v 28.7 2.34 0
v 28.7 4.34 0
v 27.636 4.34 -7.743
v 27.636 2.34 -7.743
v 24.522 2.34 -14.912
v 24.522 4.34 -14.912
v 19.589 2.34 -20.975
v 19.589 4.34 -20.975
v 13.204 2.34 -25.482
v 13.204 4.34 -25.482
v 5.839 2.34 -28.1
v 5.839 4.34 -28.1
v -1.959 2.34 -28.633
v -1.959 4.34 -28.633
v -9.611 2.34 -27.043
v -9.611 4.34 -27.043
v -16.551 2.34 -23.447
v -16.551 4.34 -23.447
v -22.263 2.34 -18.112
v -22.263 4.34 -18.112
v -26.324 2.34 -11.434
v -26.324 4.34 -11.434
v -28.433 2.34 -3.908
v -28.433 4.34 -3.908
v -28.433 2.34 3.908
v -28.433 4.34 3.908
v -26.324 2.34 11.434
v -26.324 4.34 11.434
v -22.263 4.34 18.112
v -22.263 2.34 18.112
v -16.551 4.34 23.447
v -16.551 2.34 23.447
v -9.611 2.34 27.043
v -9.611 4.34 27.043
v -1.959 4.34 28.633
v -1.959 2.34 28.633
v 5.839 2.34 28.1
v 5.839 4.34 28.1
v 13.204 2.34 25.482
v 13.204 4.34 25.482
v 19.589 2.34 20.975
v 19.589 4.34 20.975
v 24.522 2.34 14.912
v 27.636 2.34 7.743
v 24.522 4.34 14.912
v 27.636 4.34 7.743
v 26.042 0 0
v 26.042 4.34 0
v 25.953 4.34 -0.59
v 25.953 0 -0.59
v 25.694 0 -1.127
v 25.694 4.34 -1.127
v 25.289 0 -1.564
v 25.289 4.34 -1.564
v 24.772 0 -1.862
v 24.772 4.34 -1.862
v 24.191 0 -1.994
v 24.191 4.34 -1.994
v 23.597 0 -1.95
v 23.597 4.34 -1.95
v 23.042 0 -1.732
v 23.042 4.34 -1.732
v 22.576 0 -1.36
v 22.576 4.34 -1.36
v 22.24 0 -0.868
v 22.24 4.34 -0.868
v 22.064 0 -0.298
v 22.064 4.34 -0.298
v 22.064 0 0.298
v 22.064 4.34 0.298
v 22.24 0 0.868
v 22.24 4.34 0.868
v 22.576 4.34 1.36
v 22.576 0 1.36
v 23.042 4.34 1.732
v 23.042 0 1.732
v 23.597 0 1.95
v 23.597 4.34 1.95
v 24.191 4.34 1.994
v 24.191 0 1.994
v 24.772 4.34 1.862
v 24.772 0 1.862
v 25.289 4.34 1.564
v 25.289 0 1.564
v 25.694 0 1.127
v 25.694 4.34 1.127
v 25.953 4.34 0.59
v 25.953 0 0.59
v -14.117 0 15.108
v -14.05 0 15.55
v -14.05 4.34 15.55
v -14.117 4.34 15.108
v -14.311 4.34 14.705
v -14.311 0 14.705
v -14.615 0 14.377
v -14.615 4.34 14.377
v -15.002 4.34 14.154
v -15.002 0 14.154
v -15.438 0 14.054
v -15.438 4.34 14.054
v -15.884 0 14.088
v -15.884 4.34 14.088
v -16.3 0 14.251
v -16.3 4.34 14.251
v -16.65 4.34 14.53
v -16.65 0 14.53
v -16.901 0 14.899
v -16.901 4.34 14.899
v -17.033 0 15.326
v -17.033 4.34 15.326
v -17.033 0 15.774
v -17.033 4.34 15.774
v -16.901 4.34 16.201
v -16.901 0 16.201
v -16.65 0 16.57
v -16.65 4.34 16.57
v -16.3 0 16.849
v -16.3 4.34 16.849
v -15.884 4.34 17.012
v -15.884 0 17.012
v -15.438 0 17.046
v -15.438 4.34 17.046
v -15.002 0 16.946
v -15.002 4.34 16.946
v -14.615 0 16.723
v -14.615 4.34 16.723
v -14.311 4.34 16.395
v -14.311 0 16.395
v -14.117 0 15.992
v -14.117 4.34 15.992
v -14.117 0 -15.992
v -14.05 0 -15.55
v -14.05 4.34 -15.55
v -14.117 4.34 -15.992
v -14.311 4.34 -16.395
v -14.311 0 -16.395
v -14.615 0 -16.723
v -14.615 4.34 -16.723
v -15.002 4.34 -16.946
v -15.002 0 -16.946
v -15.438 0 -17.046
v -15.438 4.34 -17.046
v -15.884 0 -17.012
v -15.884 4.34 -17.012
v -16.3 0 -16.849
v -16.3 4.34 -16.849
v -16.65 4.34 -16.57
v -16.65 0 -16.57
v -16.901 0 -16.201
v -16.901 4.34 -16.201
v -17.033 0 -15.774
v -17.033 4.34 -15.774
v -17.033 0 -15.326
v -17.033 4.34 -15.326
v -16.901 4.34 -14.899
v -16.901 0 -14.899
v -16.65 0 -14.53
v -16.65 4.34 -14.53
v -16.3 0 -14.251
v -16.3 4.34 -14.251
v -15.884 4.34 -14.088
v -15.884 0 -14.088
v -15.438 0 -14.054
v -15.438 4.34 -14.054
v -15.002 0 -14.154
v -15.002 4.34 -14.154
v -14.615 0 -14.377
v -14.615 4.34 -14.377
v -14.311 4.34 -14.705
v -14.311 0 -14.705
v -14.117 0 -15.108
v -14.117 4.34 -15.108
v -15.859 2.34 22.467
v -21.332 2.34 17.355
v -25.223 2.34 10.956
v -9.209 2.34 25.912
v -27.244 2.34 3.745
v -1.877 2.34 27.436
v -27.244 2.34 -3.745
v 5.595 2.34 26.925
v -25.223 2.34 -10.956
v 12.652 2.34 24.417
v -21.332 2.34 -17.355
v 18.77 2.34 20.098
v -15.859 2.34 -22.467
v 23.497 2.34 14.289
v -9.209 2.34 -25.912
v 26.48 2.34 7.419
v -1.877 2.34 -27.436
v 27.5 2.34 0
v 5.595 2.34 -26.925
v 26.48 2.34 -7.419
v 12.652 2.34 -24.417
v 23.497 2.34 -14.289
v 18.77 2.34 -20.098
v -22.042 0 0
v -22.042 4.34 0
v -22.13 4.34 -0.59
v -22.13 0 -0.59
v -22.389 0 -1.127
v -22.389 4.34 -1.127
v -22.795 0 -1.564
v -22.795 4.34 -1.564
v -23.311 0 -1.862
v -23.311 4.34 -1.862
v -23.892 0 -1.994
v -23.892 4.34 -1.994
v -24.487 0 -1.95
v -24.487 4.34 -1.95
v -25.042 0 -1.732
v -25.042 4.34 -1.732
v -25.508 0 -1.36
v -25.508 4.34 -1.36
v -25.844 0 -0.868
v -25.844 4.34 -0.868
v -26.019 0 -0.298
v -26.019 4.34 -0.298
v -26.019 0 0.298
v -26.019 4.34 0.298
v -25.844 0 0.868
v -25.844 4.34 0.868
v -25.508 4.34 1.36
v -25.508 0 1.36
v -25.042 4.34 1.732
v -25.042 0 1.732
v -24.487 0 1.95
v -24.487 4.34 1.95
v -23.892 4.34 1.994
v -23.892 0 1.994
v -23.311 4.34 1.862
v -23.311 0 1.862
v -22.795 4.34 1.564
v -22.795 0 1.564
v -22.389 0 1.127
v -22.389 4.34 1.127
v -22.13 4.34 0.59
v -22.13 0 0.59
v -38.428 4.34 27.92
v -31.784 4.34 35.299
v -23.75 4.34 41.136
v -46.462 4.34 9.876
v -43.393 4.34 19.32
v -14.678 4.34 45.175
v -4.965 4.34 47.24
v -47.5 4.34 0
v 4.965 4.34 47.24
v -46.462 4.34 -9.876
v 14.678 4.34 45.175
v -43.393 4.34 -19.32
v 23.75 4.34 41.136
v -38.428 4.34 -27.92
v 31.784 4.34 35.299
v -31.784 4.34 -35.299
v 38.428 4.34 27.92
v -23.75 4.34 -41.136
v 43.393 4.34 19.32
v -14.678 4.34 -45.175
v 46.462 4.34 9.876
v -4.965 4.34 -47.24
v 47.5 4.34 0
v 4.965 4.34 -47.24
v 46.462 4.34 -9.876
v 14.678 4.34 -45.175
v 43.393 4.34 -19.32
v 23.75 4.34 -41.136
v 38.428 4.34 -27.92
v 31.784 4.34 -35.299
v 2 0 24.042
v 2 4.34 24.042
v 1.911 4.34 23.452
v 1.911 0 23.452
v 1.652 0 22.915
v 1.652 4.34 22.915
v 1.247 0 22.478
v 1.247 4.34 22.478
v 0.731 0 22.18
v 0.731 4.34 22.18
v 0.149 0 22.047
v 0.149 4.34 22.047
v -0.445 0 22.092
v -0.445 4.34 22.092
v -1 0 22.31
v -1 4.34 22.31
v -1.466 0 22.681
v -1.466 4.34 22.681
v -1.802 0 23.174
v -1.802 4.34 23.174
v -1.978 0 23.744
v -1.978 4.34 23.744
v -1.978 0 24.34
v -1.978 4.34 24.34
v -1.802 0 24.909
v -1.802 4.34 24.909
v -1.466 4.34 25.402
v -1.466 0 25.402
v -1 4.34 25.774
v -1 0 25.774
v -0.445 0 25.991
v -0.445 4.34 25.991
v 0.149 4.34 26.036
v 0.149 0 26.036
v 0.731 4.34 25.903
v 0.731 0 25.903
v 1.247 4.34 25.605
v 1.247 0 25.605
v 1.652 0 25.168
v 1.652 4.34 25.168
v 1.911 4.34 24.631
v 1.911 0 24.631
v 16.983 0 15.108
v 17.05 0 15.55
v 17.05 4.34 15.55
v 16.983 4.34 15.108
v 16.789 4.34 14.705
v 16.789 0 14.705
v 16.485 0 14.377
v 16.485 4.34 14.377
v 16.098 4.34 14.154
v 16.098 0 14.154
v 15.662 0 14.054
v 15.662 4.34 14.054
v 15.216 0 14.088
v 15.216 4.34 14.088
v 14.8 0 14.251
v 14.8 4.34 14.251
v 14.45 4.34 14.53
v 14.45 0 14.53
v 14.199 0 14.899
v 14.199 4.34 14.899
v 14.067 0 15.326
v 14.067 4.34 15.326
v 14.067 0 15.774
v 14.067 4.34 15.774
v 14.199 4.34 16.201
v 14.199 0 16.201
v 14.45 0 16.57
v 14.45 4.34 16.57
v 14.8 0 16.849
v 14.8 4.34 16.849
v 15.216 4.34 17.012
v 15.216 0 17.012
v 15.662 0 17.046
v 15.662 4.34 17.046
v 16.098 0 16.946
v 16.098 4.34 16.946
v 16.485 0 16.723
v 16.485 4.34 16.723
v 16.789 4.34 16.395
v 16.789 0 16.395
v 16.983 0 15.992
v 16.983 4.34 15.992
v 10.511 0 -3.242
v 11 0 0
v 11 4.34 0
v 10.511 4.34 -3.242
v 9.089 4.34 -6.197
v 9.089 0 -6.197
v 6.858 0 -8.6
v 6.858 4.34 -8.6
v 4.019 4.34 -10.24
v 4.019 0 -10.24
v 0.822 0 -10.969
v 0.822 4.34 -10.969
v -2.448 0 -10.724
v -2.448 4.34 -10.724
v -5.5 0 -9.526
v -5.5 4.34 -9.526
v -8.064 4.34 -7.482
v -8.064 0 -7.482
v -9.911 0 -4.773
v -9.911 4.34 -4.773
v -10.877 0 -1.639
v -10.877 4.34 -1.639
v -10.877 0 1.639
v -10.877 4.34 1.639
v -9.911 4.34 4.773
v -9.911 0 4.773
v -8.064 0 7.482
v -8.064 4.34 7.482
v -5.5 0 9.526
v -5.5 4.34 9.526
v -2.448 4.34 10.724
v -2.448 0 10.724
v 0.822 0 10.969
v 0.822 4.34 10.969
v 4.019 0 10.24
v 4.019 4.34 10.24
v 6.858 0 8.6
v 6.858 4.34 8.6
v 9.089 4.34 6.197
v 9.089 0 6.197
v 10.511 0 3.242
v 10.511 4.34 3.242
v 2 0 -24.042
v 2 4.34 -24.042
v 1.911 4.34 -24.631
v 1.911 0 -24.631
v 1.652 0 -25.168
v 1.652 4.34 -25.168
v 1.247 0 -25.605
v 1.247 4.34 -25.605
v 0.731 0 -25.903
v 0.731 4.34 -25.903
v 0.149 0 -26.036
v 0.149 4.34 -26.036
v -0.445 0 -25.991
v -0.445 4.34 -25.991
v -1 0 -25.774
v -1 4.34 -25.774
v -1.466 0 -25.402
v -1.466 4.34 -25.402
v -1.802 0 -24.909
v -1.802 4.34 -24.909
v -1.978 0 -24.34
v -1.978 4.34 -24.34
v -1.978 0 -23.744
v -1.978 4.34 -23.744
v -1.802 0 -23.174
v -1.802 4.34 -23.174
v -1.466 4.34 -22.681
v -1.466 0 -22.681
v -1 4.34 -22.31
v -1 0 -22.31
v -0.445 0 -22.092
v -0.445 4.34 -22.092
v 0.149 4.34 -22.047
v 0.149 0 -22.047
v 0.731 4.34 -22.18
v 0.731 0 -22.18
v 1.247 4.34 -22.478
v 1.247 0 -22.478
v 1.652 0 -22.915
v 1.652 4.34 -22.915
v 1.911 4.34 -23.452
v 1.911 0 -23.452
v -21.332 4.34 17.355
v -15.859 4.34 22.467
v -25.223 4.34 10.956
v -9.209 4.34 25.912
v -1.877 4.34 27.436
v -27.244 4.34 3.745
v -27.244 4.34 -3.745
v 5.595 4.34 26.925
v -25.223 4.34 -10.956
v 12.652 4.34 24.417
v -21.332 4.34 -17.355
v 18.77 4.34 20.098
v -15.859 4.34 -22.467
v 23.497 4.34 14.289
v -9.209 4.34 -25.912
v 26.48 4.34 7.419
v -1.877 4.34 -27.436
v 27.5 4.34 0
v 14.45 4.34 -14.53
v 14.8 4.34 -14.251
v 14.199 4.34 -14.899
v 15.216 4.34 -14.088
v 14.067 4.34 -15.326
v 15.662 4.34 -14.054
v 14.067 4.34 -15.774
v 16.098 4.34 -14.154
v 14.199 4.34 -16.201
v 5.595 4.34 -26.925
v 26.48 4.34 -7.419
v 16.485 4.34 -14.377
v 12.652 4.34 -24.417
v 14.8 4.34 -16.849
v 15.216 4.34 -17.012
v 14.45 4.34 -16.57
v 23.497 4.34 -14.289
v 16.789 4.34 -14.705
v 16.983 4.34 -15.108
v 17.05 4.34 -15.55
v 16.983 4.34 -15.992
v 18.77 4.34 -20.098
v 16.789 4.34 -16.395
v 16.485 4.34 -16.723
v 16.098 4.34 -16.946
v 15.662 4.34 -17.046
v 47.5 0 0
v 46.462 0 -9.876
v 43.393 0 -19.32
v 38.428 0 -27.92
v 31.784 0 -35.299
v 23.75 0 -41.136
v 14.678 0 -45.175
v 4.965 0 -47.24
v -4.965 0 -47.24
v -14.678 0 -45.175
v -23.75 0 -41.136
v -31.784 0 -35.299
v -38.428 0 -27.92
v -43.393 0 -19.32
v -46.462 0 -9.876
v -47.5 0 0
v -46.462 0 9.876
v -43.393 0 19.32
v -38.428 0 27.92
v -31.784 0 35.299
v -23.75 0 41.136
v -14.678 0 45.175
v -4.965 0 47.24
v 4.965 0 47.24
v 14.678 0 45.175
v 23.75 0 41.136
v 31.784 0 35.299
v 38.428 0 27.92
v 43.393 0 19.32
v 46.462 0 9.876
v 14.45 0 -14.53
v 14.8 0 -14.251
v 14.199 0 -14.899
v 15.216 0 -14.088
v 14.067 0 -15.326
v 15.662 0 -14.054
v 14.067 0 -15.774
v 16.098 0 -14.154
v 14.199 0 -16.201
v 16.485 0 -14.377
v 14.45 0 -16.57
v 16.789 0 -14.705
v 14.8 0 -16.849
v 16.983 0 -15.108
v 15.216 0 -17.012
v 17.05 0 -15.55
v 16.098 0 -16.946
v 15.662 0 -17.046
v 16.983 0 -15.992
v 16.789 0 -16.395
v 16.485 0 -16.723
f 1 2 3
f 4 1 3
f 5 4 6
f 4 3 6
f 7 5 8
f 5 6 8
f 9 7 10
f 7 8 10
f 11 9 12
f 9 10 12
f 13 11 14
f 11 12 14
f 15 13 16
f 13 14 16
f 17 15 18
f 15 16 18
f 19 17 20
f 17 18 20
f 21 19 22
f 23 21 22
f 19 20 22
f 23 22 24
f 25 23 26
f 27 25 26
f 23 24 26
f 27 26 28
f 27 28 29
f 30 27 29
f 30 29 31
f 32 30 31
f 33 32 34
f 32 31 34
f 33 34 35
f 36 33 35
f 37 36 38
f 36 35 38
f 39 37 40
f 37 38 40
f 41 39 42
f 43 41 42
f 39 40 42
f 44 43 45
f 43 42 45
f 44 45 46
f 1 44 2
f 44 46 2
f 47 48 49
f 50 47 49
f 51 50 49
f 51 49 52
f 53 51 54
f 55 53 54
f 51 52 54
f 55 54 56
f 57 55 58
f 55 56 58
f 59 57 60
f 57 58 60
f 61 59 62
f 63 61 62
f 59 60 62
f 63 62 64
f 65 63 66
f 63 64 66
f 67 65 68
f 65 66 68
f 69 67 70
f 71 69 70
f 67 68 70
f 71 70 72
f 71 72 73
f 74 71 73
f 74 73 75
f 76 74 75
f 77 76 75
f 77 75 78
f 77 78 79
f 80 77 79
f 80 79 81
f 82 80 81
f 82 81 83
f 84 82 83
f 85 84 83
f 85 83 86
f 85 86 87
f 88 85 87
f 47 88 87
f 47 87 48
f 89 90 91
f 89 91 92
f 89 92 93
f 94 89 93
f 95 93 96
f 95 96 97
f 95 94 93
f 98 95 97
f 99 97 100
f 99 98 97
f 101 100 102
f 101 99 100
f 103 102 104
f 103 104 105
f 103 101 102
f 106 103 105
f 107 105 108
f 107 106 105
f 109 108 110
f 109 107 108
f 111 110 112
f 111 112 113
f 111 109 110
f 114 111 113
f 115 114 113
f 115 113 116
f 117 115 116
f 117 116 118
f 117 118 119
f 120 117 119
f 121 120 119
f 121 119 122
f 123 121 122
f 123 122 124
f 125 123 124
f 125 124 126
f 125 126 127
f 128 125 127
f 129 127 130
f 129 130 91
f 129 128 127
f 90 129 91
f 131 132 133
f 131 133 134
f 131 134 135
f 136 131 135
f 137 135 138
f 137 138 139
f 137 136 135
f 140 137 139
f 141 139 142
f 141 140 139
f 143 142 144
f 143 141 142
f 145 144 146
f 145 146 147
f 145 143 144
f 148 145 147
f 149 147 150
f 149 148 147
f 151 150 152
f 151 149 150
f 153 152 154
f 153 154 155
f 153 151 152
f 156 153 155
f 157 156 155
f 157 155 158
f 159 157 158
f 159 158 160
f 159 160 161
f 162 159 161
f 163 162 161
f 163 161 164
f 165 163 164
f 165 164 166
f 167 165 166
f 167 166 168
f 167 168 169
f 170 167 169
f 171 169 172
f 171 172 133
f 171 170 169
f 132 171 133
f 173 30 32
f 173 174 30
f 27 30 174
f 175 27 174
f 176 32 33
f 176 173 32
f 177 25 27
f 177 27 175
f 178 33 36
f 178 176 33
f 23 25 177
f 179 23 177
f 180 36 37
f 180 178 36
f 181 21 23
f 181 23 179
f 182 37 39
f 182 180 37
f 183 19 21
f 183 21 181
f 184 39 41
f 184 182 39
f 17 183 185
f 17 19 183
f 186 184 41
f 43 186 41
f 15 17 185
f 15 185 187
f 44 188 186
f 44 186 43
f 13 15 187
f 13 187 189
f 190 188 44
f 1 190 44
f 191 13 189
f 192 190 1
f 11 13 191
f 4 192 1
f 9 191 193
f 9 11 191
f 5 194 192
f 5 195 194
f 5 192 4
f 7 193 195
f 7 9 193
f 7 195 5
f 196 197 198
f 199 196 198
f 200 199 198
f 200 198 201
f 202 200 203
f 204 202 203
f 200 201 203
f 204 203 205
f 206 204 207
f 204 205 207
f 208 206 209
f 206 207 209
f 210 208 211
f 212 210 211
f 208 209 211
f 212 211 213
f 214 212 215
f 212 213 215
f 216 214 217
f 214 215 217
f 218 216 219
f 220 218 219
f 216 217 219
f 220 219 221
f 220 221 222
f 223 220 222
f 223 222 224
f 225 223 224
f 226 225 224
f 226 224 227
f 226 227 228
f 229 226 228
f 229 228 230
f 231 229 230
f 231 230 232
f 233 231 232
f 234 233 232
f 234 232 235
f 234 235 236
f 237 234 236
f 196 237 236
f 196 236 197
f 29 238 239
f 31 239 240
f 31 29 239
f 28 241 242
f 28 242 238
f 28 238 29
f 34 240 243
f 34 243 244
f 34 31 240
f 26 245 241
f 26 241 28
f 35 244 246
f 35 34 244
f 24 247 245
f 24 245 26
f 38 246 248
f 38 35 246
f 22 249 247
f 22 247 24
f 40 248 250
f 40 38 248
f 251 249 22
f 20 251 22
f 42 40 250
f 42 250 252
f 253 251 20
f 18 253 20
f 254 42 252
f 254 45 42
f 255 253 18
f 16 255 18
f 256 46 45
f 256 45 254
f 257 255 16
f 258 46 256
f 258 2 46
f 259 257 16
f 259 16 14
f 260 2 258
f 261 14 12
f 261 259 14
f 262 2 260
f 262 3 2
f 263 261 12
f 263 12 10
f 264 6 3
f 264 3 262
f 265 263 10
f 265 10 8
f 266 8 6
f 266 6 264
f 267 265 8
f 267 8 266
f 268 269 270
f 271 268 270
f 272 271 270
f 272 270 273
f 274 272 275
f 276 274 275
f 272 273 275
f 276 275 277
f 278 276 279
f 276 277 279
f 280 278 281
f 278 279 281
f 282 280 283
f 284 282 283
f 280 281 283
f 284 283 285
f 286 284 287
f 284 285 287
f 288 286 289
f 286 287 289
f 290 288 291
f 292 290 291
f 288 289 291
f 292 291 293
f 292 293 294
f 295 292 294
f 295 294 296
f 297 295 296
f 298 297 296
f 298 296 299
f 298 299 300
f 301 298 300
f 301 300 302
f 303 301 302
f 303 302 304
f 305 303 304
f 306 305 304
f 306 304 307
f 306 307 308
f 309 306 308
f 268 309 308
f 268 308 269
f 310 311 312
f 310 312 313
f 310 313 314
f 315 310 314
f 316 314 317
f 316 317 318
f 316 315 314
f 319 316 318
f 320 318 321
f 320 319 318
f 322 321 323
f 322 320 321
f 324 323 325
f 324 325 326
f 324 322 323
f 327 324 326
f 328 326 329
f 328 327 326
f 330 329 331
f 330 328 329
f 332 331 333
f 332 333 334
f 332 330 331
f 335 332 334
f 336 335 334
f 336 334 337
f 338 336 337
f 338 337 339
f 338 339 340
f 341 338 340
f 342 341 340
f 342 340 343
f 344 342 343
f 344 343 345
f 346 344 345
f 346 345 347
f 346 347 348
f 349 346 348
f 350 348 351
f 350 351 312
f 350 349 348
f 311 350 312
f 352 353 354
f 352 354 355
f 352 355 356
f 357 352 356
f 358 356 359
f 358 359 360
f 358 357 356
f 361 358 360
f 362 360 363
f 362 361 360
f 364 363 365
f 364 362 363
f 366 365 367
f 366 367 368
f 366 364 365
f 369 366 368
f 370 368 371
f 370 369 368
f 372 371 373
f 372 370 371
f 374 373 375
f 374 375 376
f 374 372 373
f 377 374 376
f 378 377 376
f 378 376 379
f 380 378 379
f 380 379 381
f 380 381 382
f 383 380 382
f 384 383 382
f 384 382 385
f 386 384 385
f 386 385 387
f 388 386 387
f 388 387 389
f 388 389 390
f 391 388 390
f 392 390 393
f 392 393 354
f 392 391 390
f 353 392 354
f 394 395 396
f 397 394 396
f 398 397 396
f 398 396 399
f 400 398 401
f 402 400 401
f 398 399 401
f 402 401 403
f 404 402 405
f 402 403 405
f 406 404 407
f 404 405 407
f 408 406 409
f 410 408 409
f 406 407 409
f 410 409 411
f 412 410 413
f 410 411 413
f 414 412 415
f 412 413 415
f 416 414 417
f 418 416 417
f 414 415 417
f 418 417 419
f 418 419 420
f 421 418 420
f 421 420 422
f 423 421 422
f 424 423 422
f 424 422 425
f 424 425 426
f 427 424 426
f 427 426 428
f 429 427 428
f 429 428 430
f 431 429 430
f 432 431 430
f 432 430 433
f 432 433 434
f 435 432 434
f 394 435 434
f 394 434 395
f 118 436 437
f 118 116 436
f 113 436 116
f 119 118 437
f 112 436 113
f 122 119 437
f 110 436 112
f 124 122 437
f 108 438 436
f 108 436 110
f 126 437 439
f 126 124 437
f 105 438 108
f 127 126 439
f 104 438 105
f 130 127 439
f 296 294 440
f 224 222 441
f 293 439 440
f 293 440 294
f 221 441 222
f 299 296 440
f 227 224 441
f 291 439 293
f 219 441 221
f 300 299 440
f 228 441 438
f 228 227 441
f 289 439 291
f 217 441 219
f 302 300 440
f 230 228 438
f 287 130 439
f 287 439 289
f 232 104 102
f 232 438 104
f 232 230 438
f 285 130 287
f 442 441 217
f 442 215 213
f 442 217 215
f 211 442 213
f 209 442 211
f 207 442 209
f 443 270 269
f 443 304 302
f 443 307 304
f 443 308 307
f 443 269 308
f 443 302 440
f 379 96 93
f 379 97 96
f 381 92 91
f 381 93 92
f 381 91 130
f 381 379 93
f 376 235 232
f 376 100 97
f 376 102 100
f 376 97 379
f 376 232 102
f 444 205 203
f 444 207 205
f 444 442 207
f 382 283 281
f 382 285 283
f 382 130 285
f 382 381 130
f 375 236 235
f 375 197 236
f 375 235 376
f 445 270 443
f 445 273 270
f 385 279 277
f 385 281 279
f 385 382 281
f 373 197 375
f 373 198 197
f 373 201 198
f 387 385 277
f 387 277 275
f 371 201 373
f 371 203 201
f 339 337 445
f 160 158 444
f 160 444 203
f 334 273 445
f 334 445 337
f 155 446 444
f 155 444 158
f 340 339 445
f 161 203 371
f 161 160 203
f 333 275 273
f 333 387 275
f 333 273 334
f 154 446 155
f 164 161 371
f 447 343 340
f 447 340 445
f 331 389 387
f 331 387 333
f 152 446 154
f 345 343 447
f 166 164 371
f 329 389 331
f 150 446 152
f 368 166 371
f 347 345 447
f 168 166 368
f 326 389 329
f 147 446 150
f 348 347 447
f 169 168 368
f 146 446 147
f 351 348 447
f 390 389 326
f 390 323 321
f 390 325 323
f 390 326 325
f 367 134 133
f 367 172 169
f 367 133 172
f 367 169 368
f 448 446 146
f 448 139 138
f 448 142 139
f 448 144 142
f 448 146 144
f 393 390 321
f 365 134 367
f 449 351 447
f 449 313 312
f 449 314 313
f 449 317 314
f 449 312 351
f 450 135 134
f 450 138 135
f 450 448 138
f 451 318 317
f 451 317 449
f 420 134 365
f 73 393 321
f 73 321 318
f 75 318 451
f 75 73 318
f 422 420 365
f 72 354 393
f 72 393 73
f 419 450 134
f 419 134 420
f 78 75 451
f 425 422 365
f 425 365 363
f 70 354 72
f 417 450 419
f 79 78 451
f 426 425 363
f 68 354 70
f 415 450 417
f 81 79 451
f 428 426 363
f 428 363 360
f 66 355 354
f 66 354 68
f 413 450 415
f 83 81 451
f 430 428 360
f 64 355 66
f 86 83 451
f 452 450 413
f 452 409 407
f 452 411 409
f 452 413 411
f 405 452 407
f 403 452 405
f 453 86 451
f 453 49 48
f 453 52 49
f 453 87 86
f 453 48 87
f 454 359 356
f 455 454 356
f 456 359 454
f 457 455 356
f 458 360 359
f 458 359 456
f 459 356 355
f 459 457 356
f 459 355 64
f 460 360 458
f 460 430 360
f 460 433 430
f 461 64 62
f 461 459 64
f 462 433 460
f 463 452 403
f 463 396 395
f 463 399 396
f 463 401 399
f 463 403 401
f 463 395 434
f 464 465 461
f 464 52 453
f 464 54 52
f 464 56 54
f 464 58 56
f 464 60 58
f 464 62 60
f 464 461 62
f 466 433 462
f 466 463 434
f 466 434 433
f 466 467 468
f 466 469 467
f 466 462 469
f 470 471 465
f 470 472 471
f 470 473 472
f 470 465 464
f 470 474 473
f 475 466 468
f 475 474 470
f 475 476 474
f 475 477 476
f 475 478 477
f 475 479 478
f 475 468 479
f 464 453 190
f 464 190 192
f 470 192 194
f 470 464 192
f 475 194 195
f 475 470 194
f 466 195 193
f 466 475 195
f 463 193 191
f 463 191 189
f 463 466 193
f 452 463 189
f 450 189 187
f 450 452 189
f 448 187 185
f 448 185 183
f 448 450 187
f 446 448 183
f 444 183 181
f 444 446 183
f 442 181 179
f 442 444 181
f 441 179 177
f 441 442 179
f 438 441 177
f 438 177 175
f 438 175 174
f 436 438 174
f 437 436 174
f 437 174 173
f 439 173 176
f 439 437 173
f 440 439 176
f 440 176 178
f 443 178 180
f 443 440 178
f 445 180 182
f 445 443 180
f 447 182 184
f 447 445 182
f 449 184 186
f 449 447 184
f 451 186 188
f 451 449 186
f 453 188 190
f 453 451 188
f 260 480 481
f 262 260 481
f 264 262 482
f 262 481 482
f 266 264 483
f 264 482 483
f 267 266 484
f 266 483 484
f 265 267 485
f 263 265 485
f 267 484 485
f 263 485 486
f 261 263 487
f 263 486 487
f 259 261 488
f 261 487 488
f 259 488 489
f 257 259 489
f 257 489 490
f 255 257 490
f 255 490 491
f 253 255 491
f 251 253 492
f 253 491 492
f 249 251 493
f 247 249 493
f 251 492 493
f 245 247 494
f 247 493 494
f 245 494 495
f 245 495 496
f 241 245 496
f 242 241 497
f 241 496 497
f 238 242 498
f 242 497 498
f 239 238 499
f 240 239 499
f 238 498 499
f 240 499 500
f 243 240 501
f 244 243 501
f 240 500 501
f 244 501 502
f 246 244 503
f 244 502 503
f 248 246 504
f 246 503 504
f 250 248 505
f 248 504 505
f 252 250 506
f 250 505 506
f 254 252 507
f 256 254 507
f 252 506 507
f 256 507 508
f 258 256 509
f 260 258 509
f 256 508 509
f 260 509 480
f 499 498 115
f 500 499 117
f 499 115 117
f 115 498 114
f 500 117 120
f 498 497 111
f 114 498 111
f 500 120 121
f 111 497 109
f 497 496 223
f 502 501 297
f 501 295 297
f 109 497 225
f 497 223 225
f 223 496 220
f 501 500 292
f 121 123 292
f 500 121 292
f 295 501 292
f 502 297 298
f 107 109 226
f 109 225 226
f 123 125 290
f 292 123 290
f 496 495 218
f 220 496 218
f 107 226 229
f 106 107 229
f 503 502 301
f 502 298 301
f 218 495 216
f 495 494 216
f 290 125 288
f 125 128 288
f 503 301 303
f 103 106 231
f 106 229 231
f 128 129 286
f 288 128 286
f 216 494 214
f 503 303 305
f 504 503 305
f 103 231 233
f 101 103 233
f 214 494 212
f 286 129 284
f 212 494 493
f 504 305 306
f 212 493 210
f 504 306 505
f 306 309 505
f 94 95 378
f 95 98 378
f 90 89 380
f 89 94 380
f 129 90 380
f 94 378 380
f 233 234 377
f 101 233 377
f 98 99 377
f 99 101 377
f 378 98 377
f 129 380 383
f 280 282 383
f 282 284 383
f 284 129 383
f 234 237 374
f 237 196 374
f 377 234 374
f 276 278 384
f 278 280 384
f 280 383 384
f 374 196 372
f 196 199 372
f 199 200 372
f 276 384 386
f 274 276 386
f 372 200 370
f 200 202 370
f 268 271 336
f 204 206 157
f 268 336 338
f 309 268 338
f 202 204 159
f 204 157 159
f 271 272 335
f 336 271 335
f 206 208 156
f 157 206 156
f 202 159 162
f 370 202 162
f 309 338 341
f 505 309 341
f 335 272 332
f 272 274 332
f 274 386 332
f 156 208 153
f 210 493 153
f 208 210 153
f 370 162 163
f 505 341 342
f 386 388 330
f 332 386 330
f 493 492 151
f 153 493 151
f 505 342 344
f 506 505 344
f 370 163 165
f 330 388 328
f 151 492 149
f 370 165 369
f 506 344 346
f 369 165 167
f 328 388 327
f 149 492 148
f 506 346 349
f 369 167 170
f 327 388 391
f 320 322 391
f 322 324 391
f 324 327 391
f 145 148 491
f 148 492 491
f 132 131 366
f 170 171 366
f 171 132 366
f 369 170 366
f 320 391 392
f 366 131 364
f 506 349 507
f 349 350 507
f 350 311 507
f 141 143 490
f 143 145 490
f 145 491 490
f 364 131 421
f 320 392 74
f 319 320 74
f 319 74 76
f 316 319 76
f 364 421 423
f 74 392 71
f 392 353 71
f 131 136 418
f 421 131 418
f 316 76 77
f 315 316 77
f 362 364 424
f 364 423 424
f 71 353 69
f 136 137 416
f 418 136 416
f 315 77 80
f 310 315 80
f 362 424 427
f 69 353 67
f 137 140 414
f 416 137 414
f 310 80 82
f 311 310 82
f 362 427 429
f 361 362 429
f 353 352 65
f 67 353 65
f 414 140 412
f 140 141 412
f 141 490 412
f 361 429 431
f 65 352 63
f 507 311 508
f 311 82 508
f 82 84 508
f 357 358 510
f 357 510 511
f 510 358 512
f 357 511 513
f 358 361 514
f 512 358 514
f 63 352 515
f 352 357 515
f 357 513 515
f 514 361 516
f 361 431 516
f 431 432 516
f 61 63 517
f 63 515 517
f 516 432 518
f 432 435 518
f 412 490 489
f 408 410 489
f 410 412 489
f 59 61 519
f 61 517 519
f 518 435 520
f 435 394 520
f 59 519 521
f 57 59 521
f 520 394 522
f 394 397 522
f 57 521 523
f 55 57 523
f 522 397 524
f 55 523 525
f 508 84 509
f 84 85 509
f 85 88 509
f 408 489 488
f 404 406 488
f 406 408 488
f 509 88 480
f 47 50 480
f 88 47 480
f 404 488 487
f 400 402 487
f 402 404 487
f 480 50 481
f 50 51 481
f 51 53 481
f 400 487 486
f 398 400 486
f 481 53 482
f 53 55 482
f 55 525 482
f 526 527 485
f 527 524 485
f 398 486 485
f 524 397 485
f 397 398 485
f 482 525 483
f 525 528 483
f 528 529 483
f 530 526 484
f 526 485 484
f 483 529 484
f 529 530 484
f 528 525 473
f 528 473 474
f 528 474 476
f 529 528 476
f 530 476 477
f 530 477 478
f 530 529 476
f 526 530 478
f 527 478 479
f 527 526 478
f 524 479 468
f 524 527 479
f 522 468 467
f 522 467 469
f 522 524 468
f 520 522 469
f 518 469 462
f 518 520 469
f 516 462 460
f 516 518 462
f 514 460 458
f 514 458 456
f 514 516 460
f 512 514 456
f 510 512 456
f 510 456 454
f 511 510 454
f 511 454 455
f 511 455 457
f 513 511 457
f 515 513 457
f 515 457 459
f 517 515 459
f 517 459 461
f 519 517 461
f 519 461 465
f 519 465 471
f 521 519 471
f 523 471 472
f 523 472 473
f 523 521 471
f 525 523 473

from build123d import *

# Parameters (mm, degrees)
SKETCH1_R           = 47.5
SKETCH1_R_2         = 11
SKETCH1_R_3         = 1.5
BOSS_EXTRUDE1_DEPTH = 4.34
SKETCH2_R           = 28.7
SKETCH2_R_2         = 27.5
CUT_EXTRUDE1_DEPTH  = 2
CUT_EXTRUDE2_REACH  = 6.34
SKETCH3_R           = 2


with BuildPart() as part:
    # Sketch1 → Boss-Extrude1 (new body)
    with BuildSketch(Plane(origin=(0, 0, 0), x_dir=(1, 0, 0), z_dir=(0, 1, 0))):
        Circle(SKETCH1_R)
        Circle(SKETCH1_R_2, mode=Mode.SUBTRACT)
        with Locations((15.55, 15.55)):
            Circle(SKETCH1_R_3, mode=Mode.SUBTRACT)
        with Locations((15.55, -15.55)):
            Circle(SKETCH1_R_3, mode=Mode.SUBTRACT)
        with Locations((-15.55, -15.55)):
            Circle(SKETCH1_R_3, mode=Mode.SUBTRACT)
        with Locations((-15.55, 15.55)):
            Circle(SKETCH1_R_3, mode=Mode.SUBTRACT)
    extrude(amount=BOSS_EXTRUDE1_DEPTH)

    # Sketch2 → Cut-Extrude1 (cut)
    with BuildSketch(Plane(origin=(0, 4.34, 0), x_dir=(1, 0, 0), z_dir=(0, 1, 0))):
        Circle(SKETCH2_R)
        Circle(SKETCH2_R_2, mode=Mode.SUBTRACT)
    extrude(amount=-CUT_EXTRUDE1_DEPTH, mode=Mode.SUBTRACT)

    # Sketch3 → Cut-Extrude2 (cut, up to next)
    with BuildSketch(Plane(origin=(0, 4.34, 0), x_dir=(1, 0, 0), z_dir=(0, 1, 0)), mode=Mode.PRIVATE) as cut_extrude2_sk1:
        with Locations((24.04163056, 0)):
            Circle(SKETCH3_R)
    cut_extrude2_tool1 = extrude(cut_extrude2_sk1.sketch, amount=-CUT_EXTRUDE2_REACH, mode=Mode.PRIVATE) & part.part
    add(cut_extrude2_tool1.solids().sort_by_distance((24.041631, 4.34, 0))[0], mode=Mode.SUBTRACT)
    # Sketch3 → Cut-Extrude2 (cut, up to next)
    with BuildSketch(Plane(origin=(0, 4.34, 0), x_dir=(1, 0, 0), z_dir=(0, 1, 0)), mode=Mode.PRIVATE) as cut_extrude2_sk2:
        with Locations((0, -24.04163056)):
            Circle(SKETCH3_R)
    cut_extrude2_tool2 = extrude(cut_extrude2_sk2.sketch, amount=-CUT_EXTRUDE2_REACH, mode=Mode.PRIVATE) & part.part
    add(cut_extrude2_tool2.solids().sort_by_distance((0, 4.34, 24.041631))[0], mode=Mode.SUBTRACT)
    # Sketch3 → Cut-Extrude2 (cut, up to next)
    with BuildSketch(Plane(origin=(0, 4.34, 0), x_dir=(1, 0, 0), z_dir=(0, 1, 0)), mode=Mode.PRIVATE) as cut_extrude2_sk3:
        with Locations((-24.04163056, 0)):
            Circle(SKETCH3_R)
    cut_extrude2_tool3 = extrude(cut_extrude2_sk3.sketch, amount=-CUT_EXTRUDE2_REACH, mode=Mode.PRIVATE) & part.part
    add(cut_extrude2_tool3.solids().sort_by_distance((-24.041631, 4.34, 0))[0], mode=Mode.SUBTRACT)
    # Sketch3 → Cut-Extrude2 (cut, up to next)
    with BuildSketch(Plane(origin=(0, 4.34, 0), x_dir=(1, 0, 0), z_dir=(0, 1, 0)), mode=Mode.PRIVATE) as cut_extrude2_sk4:
        with Locations((0, 24.04163056)):
            Circle(SKETCH3_R)
    cut_extrude2_tool4 = extrude(cut_extrude2_sk4.sketch, amount=-CUT_EXTRUDE2_REACH, mode=Mode.PRIVATE) & part.part
    add(cut_extrude2_tool4.solids().sort_by_distance((0, 4.34, -24.041631))[0], mode=Mode.SUBTRACT)


solid = part.part
